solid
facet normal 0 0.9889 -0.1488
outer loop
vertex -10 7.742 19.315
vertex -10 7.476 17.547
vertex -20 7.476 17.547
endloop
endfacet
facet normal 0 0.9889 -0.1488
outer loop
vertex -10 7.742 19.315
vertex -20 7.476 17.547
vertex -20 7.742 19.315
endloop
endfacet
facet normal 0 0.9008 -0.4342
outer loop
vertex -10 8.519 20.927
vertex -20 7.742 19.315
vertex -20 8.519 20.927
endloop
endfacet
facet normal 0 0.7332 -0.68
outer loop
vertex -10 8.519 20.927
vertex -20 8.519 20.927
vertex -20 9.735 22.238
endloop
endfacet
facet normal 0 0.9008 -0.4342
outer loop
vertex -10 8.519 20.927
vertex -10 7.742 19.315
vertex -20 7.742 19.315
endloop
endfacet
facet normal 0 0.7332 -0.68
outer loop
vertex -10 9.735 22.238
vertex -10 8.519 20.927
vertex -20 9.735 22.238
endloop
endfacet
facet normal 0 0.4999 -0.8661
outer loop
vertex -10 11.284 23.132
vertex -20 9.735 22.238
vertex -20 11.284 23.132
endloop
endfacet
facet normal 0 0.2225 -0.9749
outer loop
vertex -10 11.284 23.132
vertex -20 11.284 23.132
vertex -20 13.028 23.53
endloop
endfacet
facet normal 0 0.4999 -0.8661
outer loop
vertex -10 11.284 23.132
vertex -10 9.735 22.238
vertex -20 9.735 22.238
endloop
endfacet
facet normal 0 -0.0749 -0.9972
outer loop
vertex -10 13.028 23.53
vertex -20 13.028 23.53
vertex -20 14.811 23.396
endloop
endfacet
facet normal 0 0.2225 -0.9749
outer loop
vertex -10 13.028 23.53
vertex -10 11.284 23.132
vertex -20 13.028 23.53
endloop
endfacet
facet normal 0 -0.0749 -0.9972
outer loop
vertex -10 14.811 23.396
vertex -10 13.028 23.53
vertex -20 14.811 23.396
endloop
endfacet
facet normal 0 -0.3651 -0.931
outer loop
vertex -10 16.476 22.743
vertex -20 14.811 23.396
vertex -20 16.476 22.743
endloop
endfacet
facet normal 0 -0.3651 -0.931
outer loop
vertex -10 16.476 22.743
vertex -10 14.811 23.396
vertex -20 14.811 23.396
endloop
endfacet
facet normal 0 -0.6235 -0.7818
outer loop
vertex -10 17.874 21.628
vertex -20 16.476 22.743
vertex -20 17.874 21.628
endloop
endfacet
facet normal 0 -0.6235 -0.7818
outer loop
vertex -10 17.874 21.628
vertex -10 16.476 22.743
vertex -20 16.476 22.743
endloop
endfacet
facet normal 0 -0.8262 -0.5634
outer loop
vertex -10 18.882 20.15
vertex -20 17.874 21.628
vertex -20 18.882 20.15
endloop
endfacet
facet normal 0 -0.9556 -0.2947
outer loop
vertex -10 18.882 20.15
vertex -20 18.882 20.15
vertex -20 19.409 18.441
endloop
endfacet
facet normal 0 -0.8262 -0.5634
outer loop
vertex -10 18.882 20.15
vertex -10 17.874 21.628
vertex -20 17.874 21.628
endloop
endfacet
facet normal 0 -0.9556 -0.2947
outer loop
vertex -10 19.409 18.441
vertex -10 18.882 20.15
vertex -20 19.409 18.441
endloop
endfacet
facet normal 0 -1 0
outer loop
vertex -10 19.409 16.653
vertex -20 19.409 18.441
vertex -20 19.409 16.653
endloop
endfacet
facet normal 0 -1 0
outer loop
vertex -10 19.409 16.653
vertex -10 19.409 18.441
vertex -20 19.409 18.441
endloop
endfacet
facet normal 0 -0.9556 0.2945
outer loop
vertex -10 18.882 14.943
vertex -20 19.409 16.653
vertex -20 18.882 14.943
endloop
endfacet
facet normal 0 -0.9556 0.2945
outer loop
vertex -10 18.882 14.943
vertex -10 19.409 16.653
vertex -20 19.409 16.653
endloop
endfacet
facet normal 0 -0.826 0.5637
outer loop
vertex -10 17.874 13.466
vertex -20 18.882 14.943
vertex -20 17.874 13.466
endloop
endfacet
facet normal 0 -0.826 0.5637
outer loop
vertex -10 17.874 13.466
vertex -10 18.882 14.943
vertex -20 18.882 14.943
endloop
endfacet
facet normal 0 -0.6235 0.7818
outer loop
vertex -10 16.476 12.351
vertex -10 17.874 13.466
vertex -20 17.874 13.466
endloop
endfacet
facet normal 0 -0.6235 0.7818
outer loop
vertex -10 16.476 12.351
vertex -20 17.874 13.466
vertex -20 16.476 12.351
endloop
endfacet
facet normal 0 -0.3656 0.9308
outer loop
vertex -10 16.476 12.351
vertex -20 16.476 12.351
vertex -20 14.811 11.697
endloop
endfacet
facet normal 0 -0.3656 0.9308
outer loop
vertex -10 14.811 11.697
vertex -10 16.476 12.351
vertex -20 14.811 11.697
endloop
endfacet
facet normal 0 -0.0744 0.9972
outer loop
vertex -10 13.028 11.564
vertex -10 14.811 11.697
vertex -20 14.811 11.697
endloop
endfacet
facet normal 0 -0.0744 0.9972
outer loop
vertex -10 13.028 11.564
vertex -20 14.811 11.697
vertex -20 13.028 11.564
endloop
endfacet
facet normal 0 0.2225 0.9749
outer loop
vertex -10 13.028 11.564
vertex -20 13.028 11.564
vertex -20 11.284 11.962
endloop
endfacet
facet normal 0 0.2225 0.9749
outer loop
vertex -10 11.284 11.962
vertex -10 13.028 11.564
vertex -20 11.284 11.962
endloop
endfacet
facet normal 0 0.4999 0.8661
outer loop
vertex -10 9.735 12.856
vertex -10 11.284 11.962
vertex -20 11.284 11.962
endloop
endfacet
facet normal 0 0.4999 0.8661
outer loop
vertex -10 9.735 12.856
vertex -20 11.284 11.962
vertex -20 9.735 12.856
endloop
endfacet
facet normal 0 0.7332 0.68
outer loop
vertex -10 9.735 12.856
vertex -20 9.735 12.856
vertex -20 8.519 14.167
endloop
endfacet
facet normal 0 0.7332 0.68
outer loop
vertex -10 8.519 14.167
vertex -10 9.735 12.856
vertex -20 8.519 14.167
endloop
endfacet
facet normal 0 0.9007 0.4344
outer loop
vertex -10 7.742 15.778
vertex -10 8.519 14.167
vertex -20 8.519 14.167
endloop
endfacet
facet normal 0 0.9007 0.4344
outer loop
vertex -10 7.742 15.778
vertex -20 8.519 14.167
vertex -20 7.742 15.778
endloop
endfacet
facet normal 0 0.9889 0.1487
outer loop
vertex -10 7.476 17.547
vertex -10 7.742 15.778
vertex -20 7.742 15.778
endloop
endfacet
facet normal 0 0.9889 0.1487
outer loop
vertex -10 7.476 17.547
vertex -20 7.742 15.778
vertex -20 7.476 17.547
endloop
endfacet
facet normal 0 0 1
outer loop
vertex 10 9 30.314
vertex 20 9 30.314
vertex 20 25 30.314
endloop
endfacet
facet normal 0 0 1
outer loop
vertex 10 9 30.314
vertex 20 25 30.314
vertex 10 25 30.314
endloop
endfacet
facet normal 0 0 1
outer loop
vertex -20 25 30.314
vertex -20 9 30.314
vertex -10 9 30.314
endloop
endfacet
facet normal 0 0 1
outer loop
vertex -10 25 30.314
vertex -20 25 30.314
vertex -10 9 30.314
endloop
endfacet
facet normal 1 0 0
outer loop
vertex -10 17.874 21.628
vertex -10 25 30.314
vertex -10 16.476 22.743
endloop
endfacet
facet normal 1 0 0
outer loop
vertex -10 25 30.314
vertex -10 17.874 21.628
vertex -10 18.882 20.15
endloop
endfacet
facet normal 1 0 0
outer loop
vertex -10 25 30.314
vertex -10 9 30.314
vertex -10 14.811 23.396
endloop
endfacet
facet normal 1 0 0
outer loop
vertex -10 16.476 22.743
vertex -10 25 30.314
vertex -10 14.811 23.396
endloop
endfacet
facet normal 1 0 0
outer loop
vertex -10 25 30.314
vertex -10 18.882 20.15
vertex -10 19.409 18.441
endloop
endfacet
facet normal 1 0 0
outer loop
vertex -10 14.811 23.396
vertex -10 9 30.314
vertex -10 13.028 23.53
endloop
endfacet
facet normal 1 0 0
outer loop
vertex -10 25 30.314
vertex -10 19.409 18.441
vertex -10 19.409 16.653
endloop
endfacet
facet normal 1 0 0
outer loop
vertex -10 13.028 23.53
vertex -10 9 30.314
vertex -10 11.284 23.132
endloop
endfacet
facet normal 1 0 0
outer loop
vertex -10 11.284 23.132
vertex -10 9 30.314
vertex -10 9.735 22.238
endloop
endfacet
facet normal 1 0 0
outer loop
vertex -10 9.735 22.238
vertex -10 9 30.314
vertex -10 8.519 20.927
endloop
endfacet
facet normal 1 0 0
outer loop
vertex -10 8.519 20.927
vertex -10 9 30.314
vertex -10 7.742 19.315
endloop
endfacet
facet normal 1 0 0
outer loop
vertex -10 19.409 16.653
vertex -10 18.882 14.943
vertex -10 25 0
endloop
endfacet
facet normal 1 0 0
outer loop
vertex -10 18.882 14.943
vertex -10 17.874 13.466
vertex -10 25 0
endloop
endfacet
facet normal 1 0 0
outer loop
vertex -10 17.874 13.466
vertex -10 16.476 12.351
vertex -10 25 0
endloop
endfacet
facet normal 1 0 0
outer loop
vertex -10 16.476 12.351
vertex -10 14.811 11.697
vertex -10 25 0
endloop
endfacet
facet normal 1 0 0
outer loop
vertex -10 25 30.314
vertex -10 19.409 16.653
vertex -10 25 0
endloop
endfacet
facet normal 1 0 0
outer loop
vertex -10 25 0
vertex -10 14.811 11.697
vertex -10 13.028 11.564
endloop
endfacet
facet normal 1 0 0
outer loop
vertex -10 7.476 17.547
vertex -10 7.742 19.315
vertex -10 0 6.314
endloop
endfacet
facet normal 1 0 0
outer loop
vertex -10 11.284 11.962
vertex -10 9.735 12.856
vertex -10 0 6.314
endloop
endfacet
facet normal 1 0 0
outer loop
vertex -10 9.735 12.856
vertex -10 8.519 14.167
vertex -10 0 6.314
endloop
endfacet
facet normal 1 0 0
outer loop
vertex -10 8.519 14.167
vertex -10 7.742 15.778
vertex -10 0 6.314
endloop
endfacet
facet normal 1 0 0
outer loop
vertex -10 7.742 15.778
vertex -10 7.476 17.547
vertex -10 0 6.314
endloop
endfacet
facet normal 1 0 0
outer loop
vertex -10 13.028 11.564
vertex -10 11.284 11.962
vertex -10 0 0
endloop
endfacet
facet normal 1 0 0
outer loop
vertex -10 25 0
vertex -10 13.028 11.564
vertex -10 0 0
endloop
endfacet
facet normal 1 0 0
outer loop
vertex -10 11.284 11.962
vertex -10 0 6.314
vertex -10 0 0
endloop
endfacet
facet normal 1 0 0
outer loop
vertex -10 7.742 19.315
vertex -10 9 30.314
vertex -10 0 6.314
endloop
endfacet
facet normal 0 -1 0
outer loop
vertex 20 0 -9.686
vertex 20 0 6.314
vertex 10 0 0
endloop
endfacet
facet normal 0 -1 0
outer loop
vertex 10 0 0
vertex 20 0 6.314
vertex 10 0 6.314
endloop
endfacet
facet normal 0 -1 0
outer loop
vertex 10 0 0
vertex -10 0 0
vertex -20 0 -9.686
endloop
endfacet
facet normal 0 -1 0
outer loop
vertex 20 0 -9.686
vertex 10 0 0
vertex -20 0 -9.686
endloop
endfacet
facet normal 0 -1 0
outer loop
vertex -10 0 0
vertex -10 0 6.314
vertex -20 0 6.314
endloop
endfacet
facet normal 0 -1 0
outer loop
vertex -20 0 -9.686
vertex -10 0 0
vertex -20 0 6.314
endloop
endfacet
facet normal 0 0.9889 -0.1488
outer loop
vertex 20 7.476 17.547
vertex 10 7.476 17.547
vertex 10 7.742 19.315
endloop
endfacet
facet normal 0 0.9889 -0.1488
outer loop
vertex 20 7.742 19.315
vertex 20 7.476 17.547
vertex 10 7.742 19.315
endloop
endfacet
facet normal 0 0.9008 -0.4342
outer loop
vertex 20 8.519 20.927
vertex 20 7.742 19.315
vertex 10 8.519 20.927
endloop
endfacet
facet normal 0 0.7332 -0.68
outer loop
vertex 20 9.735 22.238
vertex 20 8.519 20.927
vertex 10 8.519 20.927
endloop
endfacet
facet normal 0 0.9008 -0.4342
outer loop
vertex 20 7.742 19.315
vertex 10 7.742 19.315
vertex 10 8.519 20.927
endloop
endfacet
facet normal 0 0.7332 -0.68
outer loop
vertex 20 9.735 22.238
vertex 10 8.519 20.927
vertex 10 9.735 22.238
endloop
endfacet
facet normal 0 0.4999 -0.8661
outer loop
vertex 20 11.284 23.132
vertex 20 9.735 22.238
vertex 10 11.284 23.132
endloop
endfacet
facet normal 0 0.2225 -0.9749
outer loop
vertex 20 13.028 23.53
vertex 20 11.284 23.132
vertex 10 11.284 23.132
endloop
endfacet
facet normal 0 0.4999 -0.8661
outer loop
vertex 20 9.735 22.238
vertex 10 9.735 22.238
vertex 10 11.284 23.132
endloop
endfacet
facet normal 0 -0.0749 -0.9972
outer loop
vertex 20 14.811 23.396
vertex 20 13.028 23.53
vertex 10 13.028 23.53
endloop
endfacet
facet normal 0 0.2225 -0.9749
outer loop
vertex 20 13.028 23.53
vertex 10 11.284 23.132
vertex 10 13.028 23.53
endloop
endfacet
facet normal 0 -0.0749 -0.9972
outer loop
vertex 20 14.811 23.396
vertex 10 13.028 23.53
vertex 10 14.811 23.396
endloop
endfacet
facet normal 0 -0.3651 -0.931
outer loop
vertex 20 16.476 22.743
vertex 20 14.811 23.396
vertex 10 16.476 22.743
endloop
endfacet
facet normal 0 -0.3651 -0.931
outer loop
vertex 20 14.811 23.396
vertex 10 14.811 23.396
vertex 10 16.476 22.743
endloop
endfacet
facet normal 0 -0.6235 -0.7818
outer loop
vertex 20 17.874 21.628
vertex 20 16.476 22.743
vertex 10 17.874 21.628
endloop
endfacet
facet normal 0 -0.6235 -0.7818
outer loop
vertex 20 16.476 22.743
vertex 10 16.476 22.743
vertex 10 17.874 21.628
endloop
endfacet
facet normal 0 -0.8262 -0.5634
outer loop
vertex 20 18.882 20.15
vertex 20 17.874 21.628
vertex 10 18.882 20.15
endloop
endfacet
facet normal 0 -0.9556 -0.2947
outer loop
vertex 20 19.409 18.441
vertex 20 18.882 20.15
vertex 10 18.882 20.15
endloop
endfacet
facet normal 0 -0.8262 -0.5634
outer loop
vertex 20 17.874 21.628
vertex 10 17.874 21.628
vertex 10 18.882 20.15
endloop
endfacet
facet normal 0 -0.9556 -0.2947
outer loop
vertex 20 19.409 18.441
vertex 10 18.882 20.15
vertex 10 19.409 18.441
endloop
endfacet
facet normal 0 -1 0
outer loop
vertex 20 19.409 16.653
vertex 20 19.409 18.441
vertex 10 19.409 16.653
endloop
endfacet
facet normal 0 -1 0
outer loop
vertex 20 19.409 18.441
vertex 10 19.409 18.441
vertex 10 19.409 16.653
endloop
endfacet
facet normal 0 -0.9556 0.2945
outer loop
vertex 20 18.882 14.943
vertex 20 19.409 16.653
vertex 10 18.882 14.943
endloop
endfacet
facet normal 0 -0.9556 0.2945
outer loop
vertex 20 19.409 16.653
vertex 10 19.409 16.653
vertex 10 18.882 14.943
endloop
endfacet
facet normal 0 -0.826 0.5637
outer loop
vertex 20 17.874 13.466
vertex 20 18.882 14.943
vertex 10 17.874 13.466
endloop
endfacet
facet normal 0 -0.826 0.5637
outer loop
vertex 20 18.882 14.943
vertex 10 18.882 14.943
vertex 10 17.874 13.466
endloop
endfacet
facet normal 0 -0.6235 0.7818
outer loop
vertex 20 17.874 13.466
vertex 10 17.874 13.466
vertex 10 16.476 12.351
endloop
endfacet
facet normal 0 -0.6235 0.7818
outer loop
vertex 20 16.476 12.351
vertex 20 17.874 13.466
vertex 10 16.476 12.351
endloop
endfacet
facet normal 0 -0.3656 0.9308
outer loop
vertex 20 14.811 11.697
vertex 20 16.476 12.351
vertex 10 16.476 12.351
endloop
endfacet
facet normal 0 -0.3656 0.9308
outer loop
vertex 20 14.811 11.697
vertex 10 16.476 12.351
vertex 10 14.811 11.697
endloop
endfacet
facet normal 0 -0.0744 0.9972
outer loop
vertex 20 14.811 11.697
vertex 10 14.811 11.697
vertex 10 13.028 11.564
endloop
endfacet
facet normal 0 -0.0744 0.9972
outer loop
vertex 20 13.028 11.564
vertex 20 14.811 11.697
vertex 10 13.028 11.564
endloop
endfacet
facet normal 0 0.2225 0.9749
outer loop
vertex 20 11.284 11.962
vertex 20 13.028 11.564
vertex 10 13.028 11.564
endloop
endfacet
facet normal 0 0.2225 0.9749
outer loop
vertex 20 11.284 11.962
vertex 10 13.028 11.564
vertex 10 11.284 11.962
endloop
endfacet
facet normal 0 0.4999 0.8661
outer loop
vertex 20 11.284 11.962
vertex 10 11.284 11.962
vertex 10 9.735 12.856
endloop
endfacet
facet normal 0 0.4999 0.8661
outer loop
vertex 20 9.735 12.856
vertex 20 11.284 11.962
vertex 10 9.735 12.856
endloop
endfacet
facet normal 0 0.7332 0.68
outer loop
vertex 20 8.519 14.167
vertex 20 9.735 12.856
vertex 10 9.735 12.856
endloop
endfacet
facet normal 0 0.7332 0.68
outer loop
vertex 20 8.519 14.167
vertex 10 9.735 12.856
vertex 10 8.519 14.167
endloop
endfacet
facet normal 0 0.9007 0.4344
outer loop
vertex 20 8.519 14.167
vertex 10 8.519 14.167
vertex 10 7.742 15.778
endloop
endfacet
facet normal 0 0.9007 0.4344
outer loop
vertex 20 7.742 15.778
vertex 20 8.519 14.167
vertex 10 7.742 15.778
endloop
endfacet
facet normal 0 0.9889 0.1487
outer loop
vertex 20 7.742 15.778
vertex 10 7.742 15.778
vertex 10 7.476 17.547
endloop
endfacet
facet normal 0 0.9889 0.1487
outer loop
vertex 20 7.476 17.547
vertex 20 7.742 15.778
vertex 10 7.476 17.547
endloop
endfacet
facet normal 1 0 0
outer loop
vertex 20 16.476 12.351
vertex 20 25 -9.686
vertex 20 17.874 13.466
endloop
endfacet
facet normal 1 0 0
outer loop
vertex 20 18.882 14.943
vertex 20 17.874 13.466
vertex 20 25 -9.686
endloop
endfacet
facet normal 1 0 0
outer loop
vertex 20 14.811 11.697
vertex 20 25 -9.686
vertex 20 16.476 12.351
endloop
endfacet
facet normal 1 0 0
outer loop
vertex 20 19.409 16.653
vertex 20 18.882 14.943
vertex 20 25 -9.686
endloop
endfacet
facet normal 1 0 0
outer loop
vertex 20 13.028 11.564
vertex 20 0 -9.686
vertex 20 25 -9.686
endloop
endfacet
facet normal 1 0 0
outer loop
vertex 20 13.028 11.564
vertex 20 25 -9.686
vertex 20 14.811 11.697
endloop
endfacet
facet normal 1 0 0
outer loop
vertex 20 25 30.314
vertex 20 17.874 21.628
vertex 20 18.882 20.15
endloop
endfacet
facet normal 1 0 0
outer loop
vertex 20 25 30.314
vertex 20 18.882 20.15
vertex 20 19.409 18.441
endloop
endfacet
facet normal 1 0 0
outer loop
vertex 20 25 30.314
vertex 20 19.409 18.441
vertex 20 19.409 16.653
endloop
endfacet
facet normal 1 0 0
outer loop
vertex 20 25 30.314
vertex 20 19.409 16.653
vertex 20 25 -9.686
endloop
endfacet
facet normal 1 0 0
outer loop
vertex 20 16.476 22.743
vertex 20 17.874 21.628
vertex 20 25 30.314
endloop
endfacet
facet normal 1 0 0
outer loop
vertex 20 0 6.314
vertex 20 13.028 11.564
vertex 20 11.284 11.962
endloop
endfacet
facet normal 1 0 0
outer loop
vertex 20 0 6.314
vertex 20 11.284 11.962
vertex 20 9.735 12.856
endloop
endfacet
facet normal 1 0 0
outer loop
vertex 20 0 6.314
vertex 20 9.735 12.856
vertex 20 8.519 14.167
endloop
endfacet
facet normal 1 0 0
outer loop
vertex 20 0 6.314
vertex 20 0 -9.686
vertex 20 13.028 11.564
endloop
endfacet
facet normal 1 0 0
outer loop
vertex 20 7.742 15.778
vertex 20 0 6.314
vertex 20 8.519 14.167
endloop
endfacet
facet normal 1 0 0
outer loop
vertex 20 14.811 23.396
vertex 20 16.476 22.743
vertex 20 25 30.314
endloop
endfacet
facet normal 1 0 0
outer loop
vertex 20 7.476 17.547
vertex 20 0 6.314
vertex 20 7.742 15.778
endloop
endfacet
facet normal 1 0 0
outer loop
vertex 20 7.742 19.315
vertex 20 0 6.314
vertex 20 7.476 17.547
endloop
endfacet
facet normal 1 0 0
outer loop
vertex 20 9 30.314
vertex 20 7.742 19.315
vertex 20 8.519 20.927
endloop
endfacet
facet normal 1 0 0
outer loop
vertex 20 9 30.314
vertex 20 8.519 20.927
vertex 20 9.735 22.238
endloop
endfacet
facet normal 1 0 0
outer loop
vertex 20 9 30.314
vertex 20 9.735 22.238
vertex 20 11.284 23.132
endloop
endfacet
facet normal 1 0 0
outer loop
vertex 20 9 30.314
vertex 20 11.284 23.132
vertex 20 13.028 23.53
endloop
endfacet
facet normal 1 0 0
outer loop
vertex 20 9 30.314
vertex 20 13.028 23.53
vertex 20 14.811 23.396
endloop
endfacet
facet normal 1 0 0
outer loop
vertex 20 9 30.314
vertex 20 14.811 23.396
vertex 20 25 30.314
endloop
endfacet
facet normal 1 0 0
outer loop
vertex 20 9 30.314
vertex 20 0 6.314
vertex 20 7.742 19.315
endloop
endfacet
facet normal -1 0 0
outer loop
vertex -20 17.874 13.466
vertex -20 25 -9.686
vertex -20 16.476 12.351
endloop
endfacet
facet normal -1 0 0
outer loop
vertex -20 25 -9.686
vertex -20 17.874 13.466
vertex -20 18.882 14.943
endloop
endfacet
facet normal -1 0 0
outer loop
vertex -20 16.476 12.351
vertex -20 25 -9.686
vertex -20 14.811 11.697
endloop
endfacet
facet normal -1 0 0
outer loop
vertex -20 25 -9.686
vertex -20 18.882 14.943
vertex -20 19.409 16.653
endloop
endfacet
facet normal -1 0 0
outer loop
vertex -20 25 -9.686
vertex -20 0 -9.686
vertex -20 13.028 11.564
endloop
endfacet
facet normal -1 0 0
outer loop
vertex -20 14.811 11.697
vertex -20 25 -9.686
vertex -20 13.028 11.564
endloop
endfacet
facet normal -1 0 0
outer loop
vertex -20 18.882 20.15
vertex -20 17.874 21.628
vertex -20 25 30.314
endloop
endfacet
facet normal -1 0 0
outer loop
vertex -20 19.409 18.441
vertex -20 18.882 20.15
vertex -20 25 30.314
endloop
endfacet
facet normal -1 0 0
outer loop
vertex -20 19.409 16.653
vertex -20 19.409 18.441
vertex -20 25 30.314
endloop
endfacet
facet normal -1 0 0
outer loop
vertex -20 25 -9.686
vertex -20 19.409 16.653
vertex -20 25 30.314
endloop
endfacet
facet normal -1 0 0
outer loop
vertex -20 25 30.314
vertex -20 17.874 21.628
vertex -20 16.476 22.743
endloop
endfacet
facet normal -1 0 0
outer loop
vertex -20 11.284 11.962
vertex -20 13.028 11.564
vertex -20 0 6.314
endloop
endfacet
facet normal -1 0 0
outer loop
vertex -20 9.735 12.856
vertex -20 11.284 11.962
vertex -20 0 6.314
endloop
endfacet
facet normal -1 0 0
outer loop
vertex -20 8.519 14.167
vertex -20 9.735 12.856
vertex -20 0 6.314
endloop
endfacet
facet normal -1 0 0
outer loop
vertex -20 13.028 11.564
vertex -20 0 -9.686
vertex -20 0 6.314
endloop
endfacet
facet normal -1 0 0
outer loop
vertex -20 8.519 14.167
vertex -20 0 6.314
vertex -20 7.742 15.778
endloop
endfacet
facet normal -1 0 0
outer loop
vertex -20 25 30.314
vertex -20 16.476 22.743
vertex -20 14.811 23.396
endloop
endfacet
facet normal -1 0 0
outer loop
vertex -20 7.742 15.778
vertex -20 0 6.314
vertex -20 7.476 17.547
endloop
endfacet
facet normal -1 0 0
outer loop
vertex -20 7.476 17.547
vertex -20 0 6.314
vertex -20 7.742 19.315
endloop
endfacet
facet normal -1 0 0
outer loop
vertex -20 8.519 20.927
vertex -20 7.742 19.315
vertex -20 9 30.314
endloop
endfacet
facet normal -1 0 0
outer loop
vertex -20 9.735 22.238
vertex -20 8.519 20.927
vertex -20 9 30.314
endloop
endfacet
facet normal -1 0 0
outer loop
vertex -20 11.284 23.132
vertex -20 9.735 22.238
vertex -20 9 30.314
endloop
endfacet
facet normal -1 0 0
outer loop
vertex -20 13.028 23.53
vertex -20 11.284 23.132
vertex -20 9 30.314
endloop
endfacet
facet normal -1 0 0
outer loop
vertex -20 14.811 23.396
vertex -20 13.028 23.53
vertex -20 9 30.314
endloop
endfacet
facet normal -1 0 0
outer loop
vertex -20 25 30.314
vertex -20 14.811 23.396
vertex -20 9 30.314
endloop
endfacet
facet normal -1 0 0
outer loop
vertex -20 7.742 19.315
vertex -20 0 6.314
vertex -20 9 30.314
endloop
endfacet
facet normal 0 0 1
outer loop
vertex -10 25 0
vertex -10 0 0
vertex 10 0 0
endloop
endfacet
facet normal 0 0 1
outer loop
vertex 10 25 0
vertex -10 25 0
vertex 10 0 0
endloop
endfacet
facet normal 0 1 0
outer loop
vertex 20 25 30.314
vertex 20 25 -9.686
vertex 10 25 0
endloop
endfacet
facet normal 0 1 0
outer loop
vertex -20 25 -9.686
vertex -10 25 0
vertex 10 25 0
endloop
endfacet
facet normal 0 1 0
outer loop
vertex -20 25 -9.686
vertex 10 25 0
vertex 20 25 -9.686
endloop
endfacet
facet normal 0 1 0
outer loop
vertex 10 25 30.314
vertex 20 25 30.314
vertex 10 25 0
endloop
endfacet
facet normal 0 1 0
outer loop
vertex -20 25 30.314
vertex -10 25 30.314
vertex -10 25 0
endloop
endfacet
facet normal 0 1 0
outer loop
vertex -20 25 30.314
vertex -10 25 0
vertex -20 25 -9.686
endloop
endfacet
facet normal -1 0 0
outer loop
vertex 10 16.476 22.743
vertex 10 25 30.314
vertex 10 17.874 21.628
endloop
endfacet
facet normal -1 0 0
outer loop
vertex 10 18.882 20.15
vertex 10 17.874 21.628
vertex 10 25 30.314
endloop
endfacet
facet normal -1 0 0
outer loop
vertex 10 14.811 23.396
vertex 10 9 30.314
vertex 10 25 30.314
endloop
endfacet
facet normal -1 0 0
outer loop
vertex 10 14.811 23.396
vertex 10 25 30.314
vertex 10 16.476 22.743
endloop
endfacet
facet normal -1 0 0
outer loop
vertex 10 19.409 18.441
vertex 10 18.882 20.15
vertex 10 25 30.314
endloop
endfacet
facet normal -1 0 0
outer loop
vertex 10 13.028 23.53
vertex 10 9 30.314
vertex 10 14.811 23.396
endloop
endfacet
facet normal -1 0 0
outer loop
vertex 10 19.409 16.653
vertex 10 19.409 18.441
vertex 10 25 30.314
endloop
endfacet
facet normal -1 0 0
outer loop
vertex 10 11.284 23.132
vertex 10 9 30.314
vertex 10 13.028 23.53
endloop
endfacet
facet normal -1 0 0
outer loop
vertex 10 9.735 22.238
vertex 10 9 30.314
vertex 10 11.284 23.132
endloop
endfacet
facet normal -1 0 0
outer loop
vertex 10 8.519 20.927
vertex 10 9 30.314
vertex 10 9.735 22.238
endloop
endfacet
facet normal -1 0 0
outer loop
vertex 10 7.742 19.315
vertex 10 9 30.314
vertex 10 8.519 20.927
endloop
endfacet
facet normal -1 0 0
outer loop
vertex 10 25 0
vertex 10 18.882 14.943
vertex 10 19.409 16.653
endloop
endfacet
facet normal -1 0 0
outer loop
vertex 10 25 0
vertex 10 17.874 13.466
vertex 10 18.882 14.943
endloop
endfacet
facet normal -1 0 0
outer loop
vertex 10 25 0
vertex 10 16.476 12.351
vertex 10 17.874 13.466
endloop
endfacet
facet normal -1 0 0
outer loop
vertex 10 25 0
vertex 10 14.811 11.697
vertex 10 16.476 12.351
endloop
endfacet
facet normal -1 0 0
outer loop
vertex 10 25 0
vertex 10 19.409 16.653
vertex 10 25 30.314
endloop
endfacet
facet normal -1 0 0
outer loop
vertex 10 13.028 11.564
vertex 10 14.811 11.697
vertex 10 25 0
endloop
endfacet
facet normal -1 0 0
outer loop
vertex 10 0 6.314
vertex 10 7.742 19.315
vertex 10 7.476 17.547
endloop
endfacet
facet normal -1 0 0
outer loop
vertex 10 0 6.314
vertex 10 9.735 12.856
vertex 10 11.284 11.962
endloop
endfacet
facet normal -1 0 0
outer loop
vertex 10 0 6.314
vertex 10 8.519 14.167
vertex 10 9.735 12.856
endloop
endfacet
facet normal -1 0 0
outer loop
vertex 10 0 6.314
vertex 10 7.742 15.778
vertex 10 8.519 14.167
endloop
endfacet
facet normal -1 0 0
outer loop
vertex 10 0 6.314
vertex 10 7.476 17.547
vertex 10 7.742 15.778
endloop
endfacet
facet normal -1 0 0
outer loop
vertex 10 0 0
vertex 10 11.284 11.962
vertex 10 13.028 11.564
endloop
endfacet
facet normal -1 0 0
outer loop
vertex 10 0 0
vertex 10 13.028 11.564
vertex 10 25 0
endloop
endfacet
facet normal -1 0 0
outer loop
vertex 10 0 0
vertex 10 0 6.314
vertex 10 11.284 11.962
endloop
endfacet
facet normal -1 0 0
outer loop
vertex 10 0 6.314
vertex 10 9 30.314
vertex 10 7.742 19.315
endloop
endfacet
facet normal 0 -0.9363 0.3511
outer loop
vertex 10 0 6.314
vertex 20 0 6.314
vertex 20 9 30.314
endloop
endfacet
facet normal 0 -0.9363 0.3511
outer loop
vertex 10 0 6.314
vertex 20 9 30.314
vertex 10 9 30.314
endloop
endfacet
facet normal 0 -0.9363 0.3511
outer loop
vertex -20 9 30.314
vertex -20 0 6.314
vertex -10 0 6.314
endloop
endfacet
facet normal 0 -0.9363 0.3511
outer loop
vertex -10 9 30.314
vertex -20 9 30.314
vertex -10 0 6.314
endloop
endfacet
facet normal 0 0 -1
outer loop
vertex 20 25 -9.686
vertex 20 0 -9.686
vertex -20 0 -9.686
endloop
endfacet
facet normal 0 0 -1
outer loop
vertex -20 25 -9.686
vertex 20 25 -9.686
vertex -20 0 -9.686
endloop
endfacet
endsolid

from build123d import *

# Parameters (mm, degrees)
F1_DEPTH = 25
F3_D     = 12
F4_SIZE2 = 24
F4_SIZE  = 9


with BuildPart() as f1:
    # F0 (on Front) → F1 (new body)
    with BuildSketch(Plane.XZ):
        Polygon((10, 30.314465), (10, 0), (0, 0), (0, -9.685535), (20, -9.685535), (20, 30.314465), align=None)
    extrude(amount=-F1_DEPTH)

    # F3 (through all)
    with Locations(Plane.YZ.offset(20)):
        with Locations((13.475935, 17.546792)):
            Hole(F3_D / 2)

    # F4
    f4_edges = [f1.edges().sort_by_distance(p)[0] for p in [
        (15, 0, 30.314465),
    ]]
    chamfer(f4_edges, length=F4_SIZE, length2=F4_SIZE2)

    # F5: F1 across plane


with BuildPart() as f1_1:
    add(f1.part)
    add(f1.part.mirror(Plane.YZ))


solid = f1_1.part
